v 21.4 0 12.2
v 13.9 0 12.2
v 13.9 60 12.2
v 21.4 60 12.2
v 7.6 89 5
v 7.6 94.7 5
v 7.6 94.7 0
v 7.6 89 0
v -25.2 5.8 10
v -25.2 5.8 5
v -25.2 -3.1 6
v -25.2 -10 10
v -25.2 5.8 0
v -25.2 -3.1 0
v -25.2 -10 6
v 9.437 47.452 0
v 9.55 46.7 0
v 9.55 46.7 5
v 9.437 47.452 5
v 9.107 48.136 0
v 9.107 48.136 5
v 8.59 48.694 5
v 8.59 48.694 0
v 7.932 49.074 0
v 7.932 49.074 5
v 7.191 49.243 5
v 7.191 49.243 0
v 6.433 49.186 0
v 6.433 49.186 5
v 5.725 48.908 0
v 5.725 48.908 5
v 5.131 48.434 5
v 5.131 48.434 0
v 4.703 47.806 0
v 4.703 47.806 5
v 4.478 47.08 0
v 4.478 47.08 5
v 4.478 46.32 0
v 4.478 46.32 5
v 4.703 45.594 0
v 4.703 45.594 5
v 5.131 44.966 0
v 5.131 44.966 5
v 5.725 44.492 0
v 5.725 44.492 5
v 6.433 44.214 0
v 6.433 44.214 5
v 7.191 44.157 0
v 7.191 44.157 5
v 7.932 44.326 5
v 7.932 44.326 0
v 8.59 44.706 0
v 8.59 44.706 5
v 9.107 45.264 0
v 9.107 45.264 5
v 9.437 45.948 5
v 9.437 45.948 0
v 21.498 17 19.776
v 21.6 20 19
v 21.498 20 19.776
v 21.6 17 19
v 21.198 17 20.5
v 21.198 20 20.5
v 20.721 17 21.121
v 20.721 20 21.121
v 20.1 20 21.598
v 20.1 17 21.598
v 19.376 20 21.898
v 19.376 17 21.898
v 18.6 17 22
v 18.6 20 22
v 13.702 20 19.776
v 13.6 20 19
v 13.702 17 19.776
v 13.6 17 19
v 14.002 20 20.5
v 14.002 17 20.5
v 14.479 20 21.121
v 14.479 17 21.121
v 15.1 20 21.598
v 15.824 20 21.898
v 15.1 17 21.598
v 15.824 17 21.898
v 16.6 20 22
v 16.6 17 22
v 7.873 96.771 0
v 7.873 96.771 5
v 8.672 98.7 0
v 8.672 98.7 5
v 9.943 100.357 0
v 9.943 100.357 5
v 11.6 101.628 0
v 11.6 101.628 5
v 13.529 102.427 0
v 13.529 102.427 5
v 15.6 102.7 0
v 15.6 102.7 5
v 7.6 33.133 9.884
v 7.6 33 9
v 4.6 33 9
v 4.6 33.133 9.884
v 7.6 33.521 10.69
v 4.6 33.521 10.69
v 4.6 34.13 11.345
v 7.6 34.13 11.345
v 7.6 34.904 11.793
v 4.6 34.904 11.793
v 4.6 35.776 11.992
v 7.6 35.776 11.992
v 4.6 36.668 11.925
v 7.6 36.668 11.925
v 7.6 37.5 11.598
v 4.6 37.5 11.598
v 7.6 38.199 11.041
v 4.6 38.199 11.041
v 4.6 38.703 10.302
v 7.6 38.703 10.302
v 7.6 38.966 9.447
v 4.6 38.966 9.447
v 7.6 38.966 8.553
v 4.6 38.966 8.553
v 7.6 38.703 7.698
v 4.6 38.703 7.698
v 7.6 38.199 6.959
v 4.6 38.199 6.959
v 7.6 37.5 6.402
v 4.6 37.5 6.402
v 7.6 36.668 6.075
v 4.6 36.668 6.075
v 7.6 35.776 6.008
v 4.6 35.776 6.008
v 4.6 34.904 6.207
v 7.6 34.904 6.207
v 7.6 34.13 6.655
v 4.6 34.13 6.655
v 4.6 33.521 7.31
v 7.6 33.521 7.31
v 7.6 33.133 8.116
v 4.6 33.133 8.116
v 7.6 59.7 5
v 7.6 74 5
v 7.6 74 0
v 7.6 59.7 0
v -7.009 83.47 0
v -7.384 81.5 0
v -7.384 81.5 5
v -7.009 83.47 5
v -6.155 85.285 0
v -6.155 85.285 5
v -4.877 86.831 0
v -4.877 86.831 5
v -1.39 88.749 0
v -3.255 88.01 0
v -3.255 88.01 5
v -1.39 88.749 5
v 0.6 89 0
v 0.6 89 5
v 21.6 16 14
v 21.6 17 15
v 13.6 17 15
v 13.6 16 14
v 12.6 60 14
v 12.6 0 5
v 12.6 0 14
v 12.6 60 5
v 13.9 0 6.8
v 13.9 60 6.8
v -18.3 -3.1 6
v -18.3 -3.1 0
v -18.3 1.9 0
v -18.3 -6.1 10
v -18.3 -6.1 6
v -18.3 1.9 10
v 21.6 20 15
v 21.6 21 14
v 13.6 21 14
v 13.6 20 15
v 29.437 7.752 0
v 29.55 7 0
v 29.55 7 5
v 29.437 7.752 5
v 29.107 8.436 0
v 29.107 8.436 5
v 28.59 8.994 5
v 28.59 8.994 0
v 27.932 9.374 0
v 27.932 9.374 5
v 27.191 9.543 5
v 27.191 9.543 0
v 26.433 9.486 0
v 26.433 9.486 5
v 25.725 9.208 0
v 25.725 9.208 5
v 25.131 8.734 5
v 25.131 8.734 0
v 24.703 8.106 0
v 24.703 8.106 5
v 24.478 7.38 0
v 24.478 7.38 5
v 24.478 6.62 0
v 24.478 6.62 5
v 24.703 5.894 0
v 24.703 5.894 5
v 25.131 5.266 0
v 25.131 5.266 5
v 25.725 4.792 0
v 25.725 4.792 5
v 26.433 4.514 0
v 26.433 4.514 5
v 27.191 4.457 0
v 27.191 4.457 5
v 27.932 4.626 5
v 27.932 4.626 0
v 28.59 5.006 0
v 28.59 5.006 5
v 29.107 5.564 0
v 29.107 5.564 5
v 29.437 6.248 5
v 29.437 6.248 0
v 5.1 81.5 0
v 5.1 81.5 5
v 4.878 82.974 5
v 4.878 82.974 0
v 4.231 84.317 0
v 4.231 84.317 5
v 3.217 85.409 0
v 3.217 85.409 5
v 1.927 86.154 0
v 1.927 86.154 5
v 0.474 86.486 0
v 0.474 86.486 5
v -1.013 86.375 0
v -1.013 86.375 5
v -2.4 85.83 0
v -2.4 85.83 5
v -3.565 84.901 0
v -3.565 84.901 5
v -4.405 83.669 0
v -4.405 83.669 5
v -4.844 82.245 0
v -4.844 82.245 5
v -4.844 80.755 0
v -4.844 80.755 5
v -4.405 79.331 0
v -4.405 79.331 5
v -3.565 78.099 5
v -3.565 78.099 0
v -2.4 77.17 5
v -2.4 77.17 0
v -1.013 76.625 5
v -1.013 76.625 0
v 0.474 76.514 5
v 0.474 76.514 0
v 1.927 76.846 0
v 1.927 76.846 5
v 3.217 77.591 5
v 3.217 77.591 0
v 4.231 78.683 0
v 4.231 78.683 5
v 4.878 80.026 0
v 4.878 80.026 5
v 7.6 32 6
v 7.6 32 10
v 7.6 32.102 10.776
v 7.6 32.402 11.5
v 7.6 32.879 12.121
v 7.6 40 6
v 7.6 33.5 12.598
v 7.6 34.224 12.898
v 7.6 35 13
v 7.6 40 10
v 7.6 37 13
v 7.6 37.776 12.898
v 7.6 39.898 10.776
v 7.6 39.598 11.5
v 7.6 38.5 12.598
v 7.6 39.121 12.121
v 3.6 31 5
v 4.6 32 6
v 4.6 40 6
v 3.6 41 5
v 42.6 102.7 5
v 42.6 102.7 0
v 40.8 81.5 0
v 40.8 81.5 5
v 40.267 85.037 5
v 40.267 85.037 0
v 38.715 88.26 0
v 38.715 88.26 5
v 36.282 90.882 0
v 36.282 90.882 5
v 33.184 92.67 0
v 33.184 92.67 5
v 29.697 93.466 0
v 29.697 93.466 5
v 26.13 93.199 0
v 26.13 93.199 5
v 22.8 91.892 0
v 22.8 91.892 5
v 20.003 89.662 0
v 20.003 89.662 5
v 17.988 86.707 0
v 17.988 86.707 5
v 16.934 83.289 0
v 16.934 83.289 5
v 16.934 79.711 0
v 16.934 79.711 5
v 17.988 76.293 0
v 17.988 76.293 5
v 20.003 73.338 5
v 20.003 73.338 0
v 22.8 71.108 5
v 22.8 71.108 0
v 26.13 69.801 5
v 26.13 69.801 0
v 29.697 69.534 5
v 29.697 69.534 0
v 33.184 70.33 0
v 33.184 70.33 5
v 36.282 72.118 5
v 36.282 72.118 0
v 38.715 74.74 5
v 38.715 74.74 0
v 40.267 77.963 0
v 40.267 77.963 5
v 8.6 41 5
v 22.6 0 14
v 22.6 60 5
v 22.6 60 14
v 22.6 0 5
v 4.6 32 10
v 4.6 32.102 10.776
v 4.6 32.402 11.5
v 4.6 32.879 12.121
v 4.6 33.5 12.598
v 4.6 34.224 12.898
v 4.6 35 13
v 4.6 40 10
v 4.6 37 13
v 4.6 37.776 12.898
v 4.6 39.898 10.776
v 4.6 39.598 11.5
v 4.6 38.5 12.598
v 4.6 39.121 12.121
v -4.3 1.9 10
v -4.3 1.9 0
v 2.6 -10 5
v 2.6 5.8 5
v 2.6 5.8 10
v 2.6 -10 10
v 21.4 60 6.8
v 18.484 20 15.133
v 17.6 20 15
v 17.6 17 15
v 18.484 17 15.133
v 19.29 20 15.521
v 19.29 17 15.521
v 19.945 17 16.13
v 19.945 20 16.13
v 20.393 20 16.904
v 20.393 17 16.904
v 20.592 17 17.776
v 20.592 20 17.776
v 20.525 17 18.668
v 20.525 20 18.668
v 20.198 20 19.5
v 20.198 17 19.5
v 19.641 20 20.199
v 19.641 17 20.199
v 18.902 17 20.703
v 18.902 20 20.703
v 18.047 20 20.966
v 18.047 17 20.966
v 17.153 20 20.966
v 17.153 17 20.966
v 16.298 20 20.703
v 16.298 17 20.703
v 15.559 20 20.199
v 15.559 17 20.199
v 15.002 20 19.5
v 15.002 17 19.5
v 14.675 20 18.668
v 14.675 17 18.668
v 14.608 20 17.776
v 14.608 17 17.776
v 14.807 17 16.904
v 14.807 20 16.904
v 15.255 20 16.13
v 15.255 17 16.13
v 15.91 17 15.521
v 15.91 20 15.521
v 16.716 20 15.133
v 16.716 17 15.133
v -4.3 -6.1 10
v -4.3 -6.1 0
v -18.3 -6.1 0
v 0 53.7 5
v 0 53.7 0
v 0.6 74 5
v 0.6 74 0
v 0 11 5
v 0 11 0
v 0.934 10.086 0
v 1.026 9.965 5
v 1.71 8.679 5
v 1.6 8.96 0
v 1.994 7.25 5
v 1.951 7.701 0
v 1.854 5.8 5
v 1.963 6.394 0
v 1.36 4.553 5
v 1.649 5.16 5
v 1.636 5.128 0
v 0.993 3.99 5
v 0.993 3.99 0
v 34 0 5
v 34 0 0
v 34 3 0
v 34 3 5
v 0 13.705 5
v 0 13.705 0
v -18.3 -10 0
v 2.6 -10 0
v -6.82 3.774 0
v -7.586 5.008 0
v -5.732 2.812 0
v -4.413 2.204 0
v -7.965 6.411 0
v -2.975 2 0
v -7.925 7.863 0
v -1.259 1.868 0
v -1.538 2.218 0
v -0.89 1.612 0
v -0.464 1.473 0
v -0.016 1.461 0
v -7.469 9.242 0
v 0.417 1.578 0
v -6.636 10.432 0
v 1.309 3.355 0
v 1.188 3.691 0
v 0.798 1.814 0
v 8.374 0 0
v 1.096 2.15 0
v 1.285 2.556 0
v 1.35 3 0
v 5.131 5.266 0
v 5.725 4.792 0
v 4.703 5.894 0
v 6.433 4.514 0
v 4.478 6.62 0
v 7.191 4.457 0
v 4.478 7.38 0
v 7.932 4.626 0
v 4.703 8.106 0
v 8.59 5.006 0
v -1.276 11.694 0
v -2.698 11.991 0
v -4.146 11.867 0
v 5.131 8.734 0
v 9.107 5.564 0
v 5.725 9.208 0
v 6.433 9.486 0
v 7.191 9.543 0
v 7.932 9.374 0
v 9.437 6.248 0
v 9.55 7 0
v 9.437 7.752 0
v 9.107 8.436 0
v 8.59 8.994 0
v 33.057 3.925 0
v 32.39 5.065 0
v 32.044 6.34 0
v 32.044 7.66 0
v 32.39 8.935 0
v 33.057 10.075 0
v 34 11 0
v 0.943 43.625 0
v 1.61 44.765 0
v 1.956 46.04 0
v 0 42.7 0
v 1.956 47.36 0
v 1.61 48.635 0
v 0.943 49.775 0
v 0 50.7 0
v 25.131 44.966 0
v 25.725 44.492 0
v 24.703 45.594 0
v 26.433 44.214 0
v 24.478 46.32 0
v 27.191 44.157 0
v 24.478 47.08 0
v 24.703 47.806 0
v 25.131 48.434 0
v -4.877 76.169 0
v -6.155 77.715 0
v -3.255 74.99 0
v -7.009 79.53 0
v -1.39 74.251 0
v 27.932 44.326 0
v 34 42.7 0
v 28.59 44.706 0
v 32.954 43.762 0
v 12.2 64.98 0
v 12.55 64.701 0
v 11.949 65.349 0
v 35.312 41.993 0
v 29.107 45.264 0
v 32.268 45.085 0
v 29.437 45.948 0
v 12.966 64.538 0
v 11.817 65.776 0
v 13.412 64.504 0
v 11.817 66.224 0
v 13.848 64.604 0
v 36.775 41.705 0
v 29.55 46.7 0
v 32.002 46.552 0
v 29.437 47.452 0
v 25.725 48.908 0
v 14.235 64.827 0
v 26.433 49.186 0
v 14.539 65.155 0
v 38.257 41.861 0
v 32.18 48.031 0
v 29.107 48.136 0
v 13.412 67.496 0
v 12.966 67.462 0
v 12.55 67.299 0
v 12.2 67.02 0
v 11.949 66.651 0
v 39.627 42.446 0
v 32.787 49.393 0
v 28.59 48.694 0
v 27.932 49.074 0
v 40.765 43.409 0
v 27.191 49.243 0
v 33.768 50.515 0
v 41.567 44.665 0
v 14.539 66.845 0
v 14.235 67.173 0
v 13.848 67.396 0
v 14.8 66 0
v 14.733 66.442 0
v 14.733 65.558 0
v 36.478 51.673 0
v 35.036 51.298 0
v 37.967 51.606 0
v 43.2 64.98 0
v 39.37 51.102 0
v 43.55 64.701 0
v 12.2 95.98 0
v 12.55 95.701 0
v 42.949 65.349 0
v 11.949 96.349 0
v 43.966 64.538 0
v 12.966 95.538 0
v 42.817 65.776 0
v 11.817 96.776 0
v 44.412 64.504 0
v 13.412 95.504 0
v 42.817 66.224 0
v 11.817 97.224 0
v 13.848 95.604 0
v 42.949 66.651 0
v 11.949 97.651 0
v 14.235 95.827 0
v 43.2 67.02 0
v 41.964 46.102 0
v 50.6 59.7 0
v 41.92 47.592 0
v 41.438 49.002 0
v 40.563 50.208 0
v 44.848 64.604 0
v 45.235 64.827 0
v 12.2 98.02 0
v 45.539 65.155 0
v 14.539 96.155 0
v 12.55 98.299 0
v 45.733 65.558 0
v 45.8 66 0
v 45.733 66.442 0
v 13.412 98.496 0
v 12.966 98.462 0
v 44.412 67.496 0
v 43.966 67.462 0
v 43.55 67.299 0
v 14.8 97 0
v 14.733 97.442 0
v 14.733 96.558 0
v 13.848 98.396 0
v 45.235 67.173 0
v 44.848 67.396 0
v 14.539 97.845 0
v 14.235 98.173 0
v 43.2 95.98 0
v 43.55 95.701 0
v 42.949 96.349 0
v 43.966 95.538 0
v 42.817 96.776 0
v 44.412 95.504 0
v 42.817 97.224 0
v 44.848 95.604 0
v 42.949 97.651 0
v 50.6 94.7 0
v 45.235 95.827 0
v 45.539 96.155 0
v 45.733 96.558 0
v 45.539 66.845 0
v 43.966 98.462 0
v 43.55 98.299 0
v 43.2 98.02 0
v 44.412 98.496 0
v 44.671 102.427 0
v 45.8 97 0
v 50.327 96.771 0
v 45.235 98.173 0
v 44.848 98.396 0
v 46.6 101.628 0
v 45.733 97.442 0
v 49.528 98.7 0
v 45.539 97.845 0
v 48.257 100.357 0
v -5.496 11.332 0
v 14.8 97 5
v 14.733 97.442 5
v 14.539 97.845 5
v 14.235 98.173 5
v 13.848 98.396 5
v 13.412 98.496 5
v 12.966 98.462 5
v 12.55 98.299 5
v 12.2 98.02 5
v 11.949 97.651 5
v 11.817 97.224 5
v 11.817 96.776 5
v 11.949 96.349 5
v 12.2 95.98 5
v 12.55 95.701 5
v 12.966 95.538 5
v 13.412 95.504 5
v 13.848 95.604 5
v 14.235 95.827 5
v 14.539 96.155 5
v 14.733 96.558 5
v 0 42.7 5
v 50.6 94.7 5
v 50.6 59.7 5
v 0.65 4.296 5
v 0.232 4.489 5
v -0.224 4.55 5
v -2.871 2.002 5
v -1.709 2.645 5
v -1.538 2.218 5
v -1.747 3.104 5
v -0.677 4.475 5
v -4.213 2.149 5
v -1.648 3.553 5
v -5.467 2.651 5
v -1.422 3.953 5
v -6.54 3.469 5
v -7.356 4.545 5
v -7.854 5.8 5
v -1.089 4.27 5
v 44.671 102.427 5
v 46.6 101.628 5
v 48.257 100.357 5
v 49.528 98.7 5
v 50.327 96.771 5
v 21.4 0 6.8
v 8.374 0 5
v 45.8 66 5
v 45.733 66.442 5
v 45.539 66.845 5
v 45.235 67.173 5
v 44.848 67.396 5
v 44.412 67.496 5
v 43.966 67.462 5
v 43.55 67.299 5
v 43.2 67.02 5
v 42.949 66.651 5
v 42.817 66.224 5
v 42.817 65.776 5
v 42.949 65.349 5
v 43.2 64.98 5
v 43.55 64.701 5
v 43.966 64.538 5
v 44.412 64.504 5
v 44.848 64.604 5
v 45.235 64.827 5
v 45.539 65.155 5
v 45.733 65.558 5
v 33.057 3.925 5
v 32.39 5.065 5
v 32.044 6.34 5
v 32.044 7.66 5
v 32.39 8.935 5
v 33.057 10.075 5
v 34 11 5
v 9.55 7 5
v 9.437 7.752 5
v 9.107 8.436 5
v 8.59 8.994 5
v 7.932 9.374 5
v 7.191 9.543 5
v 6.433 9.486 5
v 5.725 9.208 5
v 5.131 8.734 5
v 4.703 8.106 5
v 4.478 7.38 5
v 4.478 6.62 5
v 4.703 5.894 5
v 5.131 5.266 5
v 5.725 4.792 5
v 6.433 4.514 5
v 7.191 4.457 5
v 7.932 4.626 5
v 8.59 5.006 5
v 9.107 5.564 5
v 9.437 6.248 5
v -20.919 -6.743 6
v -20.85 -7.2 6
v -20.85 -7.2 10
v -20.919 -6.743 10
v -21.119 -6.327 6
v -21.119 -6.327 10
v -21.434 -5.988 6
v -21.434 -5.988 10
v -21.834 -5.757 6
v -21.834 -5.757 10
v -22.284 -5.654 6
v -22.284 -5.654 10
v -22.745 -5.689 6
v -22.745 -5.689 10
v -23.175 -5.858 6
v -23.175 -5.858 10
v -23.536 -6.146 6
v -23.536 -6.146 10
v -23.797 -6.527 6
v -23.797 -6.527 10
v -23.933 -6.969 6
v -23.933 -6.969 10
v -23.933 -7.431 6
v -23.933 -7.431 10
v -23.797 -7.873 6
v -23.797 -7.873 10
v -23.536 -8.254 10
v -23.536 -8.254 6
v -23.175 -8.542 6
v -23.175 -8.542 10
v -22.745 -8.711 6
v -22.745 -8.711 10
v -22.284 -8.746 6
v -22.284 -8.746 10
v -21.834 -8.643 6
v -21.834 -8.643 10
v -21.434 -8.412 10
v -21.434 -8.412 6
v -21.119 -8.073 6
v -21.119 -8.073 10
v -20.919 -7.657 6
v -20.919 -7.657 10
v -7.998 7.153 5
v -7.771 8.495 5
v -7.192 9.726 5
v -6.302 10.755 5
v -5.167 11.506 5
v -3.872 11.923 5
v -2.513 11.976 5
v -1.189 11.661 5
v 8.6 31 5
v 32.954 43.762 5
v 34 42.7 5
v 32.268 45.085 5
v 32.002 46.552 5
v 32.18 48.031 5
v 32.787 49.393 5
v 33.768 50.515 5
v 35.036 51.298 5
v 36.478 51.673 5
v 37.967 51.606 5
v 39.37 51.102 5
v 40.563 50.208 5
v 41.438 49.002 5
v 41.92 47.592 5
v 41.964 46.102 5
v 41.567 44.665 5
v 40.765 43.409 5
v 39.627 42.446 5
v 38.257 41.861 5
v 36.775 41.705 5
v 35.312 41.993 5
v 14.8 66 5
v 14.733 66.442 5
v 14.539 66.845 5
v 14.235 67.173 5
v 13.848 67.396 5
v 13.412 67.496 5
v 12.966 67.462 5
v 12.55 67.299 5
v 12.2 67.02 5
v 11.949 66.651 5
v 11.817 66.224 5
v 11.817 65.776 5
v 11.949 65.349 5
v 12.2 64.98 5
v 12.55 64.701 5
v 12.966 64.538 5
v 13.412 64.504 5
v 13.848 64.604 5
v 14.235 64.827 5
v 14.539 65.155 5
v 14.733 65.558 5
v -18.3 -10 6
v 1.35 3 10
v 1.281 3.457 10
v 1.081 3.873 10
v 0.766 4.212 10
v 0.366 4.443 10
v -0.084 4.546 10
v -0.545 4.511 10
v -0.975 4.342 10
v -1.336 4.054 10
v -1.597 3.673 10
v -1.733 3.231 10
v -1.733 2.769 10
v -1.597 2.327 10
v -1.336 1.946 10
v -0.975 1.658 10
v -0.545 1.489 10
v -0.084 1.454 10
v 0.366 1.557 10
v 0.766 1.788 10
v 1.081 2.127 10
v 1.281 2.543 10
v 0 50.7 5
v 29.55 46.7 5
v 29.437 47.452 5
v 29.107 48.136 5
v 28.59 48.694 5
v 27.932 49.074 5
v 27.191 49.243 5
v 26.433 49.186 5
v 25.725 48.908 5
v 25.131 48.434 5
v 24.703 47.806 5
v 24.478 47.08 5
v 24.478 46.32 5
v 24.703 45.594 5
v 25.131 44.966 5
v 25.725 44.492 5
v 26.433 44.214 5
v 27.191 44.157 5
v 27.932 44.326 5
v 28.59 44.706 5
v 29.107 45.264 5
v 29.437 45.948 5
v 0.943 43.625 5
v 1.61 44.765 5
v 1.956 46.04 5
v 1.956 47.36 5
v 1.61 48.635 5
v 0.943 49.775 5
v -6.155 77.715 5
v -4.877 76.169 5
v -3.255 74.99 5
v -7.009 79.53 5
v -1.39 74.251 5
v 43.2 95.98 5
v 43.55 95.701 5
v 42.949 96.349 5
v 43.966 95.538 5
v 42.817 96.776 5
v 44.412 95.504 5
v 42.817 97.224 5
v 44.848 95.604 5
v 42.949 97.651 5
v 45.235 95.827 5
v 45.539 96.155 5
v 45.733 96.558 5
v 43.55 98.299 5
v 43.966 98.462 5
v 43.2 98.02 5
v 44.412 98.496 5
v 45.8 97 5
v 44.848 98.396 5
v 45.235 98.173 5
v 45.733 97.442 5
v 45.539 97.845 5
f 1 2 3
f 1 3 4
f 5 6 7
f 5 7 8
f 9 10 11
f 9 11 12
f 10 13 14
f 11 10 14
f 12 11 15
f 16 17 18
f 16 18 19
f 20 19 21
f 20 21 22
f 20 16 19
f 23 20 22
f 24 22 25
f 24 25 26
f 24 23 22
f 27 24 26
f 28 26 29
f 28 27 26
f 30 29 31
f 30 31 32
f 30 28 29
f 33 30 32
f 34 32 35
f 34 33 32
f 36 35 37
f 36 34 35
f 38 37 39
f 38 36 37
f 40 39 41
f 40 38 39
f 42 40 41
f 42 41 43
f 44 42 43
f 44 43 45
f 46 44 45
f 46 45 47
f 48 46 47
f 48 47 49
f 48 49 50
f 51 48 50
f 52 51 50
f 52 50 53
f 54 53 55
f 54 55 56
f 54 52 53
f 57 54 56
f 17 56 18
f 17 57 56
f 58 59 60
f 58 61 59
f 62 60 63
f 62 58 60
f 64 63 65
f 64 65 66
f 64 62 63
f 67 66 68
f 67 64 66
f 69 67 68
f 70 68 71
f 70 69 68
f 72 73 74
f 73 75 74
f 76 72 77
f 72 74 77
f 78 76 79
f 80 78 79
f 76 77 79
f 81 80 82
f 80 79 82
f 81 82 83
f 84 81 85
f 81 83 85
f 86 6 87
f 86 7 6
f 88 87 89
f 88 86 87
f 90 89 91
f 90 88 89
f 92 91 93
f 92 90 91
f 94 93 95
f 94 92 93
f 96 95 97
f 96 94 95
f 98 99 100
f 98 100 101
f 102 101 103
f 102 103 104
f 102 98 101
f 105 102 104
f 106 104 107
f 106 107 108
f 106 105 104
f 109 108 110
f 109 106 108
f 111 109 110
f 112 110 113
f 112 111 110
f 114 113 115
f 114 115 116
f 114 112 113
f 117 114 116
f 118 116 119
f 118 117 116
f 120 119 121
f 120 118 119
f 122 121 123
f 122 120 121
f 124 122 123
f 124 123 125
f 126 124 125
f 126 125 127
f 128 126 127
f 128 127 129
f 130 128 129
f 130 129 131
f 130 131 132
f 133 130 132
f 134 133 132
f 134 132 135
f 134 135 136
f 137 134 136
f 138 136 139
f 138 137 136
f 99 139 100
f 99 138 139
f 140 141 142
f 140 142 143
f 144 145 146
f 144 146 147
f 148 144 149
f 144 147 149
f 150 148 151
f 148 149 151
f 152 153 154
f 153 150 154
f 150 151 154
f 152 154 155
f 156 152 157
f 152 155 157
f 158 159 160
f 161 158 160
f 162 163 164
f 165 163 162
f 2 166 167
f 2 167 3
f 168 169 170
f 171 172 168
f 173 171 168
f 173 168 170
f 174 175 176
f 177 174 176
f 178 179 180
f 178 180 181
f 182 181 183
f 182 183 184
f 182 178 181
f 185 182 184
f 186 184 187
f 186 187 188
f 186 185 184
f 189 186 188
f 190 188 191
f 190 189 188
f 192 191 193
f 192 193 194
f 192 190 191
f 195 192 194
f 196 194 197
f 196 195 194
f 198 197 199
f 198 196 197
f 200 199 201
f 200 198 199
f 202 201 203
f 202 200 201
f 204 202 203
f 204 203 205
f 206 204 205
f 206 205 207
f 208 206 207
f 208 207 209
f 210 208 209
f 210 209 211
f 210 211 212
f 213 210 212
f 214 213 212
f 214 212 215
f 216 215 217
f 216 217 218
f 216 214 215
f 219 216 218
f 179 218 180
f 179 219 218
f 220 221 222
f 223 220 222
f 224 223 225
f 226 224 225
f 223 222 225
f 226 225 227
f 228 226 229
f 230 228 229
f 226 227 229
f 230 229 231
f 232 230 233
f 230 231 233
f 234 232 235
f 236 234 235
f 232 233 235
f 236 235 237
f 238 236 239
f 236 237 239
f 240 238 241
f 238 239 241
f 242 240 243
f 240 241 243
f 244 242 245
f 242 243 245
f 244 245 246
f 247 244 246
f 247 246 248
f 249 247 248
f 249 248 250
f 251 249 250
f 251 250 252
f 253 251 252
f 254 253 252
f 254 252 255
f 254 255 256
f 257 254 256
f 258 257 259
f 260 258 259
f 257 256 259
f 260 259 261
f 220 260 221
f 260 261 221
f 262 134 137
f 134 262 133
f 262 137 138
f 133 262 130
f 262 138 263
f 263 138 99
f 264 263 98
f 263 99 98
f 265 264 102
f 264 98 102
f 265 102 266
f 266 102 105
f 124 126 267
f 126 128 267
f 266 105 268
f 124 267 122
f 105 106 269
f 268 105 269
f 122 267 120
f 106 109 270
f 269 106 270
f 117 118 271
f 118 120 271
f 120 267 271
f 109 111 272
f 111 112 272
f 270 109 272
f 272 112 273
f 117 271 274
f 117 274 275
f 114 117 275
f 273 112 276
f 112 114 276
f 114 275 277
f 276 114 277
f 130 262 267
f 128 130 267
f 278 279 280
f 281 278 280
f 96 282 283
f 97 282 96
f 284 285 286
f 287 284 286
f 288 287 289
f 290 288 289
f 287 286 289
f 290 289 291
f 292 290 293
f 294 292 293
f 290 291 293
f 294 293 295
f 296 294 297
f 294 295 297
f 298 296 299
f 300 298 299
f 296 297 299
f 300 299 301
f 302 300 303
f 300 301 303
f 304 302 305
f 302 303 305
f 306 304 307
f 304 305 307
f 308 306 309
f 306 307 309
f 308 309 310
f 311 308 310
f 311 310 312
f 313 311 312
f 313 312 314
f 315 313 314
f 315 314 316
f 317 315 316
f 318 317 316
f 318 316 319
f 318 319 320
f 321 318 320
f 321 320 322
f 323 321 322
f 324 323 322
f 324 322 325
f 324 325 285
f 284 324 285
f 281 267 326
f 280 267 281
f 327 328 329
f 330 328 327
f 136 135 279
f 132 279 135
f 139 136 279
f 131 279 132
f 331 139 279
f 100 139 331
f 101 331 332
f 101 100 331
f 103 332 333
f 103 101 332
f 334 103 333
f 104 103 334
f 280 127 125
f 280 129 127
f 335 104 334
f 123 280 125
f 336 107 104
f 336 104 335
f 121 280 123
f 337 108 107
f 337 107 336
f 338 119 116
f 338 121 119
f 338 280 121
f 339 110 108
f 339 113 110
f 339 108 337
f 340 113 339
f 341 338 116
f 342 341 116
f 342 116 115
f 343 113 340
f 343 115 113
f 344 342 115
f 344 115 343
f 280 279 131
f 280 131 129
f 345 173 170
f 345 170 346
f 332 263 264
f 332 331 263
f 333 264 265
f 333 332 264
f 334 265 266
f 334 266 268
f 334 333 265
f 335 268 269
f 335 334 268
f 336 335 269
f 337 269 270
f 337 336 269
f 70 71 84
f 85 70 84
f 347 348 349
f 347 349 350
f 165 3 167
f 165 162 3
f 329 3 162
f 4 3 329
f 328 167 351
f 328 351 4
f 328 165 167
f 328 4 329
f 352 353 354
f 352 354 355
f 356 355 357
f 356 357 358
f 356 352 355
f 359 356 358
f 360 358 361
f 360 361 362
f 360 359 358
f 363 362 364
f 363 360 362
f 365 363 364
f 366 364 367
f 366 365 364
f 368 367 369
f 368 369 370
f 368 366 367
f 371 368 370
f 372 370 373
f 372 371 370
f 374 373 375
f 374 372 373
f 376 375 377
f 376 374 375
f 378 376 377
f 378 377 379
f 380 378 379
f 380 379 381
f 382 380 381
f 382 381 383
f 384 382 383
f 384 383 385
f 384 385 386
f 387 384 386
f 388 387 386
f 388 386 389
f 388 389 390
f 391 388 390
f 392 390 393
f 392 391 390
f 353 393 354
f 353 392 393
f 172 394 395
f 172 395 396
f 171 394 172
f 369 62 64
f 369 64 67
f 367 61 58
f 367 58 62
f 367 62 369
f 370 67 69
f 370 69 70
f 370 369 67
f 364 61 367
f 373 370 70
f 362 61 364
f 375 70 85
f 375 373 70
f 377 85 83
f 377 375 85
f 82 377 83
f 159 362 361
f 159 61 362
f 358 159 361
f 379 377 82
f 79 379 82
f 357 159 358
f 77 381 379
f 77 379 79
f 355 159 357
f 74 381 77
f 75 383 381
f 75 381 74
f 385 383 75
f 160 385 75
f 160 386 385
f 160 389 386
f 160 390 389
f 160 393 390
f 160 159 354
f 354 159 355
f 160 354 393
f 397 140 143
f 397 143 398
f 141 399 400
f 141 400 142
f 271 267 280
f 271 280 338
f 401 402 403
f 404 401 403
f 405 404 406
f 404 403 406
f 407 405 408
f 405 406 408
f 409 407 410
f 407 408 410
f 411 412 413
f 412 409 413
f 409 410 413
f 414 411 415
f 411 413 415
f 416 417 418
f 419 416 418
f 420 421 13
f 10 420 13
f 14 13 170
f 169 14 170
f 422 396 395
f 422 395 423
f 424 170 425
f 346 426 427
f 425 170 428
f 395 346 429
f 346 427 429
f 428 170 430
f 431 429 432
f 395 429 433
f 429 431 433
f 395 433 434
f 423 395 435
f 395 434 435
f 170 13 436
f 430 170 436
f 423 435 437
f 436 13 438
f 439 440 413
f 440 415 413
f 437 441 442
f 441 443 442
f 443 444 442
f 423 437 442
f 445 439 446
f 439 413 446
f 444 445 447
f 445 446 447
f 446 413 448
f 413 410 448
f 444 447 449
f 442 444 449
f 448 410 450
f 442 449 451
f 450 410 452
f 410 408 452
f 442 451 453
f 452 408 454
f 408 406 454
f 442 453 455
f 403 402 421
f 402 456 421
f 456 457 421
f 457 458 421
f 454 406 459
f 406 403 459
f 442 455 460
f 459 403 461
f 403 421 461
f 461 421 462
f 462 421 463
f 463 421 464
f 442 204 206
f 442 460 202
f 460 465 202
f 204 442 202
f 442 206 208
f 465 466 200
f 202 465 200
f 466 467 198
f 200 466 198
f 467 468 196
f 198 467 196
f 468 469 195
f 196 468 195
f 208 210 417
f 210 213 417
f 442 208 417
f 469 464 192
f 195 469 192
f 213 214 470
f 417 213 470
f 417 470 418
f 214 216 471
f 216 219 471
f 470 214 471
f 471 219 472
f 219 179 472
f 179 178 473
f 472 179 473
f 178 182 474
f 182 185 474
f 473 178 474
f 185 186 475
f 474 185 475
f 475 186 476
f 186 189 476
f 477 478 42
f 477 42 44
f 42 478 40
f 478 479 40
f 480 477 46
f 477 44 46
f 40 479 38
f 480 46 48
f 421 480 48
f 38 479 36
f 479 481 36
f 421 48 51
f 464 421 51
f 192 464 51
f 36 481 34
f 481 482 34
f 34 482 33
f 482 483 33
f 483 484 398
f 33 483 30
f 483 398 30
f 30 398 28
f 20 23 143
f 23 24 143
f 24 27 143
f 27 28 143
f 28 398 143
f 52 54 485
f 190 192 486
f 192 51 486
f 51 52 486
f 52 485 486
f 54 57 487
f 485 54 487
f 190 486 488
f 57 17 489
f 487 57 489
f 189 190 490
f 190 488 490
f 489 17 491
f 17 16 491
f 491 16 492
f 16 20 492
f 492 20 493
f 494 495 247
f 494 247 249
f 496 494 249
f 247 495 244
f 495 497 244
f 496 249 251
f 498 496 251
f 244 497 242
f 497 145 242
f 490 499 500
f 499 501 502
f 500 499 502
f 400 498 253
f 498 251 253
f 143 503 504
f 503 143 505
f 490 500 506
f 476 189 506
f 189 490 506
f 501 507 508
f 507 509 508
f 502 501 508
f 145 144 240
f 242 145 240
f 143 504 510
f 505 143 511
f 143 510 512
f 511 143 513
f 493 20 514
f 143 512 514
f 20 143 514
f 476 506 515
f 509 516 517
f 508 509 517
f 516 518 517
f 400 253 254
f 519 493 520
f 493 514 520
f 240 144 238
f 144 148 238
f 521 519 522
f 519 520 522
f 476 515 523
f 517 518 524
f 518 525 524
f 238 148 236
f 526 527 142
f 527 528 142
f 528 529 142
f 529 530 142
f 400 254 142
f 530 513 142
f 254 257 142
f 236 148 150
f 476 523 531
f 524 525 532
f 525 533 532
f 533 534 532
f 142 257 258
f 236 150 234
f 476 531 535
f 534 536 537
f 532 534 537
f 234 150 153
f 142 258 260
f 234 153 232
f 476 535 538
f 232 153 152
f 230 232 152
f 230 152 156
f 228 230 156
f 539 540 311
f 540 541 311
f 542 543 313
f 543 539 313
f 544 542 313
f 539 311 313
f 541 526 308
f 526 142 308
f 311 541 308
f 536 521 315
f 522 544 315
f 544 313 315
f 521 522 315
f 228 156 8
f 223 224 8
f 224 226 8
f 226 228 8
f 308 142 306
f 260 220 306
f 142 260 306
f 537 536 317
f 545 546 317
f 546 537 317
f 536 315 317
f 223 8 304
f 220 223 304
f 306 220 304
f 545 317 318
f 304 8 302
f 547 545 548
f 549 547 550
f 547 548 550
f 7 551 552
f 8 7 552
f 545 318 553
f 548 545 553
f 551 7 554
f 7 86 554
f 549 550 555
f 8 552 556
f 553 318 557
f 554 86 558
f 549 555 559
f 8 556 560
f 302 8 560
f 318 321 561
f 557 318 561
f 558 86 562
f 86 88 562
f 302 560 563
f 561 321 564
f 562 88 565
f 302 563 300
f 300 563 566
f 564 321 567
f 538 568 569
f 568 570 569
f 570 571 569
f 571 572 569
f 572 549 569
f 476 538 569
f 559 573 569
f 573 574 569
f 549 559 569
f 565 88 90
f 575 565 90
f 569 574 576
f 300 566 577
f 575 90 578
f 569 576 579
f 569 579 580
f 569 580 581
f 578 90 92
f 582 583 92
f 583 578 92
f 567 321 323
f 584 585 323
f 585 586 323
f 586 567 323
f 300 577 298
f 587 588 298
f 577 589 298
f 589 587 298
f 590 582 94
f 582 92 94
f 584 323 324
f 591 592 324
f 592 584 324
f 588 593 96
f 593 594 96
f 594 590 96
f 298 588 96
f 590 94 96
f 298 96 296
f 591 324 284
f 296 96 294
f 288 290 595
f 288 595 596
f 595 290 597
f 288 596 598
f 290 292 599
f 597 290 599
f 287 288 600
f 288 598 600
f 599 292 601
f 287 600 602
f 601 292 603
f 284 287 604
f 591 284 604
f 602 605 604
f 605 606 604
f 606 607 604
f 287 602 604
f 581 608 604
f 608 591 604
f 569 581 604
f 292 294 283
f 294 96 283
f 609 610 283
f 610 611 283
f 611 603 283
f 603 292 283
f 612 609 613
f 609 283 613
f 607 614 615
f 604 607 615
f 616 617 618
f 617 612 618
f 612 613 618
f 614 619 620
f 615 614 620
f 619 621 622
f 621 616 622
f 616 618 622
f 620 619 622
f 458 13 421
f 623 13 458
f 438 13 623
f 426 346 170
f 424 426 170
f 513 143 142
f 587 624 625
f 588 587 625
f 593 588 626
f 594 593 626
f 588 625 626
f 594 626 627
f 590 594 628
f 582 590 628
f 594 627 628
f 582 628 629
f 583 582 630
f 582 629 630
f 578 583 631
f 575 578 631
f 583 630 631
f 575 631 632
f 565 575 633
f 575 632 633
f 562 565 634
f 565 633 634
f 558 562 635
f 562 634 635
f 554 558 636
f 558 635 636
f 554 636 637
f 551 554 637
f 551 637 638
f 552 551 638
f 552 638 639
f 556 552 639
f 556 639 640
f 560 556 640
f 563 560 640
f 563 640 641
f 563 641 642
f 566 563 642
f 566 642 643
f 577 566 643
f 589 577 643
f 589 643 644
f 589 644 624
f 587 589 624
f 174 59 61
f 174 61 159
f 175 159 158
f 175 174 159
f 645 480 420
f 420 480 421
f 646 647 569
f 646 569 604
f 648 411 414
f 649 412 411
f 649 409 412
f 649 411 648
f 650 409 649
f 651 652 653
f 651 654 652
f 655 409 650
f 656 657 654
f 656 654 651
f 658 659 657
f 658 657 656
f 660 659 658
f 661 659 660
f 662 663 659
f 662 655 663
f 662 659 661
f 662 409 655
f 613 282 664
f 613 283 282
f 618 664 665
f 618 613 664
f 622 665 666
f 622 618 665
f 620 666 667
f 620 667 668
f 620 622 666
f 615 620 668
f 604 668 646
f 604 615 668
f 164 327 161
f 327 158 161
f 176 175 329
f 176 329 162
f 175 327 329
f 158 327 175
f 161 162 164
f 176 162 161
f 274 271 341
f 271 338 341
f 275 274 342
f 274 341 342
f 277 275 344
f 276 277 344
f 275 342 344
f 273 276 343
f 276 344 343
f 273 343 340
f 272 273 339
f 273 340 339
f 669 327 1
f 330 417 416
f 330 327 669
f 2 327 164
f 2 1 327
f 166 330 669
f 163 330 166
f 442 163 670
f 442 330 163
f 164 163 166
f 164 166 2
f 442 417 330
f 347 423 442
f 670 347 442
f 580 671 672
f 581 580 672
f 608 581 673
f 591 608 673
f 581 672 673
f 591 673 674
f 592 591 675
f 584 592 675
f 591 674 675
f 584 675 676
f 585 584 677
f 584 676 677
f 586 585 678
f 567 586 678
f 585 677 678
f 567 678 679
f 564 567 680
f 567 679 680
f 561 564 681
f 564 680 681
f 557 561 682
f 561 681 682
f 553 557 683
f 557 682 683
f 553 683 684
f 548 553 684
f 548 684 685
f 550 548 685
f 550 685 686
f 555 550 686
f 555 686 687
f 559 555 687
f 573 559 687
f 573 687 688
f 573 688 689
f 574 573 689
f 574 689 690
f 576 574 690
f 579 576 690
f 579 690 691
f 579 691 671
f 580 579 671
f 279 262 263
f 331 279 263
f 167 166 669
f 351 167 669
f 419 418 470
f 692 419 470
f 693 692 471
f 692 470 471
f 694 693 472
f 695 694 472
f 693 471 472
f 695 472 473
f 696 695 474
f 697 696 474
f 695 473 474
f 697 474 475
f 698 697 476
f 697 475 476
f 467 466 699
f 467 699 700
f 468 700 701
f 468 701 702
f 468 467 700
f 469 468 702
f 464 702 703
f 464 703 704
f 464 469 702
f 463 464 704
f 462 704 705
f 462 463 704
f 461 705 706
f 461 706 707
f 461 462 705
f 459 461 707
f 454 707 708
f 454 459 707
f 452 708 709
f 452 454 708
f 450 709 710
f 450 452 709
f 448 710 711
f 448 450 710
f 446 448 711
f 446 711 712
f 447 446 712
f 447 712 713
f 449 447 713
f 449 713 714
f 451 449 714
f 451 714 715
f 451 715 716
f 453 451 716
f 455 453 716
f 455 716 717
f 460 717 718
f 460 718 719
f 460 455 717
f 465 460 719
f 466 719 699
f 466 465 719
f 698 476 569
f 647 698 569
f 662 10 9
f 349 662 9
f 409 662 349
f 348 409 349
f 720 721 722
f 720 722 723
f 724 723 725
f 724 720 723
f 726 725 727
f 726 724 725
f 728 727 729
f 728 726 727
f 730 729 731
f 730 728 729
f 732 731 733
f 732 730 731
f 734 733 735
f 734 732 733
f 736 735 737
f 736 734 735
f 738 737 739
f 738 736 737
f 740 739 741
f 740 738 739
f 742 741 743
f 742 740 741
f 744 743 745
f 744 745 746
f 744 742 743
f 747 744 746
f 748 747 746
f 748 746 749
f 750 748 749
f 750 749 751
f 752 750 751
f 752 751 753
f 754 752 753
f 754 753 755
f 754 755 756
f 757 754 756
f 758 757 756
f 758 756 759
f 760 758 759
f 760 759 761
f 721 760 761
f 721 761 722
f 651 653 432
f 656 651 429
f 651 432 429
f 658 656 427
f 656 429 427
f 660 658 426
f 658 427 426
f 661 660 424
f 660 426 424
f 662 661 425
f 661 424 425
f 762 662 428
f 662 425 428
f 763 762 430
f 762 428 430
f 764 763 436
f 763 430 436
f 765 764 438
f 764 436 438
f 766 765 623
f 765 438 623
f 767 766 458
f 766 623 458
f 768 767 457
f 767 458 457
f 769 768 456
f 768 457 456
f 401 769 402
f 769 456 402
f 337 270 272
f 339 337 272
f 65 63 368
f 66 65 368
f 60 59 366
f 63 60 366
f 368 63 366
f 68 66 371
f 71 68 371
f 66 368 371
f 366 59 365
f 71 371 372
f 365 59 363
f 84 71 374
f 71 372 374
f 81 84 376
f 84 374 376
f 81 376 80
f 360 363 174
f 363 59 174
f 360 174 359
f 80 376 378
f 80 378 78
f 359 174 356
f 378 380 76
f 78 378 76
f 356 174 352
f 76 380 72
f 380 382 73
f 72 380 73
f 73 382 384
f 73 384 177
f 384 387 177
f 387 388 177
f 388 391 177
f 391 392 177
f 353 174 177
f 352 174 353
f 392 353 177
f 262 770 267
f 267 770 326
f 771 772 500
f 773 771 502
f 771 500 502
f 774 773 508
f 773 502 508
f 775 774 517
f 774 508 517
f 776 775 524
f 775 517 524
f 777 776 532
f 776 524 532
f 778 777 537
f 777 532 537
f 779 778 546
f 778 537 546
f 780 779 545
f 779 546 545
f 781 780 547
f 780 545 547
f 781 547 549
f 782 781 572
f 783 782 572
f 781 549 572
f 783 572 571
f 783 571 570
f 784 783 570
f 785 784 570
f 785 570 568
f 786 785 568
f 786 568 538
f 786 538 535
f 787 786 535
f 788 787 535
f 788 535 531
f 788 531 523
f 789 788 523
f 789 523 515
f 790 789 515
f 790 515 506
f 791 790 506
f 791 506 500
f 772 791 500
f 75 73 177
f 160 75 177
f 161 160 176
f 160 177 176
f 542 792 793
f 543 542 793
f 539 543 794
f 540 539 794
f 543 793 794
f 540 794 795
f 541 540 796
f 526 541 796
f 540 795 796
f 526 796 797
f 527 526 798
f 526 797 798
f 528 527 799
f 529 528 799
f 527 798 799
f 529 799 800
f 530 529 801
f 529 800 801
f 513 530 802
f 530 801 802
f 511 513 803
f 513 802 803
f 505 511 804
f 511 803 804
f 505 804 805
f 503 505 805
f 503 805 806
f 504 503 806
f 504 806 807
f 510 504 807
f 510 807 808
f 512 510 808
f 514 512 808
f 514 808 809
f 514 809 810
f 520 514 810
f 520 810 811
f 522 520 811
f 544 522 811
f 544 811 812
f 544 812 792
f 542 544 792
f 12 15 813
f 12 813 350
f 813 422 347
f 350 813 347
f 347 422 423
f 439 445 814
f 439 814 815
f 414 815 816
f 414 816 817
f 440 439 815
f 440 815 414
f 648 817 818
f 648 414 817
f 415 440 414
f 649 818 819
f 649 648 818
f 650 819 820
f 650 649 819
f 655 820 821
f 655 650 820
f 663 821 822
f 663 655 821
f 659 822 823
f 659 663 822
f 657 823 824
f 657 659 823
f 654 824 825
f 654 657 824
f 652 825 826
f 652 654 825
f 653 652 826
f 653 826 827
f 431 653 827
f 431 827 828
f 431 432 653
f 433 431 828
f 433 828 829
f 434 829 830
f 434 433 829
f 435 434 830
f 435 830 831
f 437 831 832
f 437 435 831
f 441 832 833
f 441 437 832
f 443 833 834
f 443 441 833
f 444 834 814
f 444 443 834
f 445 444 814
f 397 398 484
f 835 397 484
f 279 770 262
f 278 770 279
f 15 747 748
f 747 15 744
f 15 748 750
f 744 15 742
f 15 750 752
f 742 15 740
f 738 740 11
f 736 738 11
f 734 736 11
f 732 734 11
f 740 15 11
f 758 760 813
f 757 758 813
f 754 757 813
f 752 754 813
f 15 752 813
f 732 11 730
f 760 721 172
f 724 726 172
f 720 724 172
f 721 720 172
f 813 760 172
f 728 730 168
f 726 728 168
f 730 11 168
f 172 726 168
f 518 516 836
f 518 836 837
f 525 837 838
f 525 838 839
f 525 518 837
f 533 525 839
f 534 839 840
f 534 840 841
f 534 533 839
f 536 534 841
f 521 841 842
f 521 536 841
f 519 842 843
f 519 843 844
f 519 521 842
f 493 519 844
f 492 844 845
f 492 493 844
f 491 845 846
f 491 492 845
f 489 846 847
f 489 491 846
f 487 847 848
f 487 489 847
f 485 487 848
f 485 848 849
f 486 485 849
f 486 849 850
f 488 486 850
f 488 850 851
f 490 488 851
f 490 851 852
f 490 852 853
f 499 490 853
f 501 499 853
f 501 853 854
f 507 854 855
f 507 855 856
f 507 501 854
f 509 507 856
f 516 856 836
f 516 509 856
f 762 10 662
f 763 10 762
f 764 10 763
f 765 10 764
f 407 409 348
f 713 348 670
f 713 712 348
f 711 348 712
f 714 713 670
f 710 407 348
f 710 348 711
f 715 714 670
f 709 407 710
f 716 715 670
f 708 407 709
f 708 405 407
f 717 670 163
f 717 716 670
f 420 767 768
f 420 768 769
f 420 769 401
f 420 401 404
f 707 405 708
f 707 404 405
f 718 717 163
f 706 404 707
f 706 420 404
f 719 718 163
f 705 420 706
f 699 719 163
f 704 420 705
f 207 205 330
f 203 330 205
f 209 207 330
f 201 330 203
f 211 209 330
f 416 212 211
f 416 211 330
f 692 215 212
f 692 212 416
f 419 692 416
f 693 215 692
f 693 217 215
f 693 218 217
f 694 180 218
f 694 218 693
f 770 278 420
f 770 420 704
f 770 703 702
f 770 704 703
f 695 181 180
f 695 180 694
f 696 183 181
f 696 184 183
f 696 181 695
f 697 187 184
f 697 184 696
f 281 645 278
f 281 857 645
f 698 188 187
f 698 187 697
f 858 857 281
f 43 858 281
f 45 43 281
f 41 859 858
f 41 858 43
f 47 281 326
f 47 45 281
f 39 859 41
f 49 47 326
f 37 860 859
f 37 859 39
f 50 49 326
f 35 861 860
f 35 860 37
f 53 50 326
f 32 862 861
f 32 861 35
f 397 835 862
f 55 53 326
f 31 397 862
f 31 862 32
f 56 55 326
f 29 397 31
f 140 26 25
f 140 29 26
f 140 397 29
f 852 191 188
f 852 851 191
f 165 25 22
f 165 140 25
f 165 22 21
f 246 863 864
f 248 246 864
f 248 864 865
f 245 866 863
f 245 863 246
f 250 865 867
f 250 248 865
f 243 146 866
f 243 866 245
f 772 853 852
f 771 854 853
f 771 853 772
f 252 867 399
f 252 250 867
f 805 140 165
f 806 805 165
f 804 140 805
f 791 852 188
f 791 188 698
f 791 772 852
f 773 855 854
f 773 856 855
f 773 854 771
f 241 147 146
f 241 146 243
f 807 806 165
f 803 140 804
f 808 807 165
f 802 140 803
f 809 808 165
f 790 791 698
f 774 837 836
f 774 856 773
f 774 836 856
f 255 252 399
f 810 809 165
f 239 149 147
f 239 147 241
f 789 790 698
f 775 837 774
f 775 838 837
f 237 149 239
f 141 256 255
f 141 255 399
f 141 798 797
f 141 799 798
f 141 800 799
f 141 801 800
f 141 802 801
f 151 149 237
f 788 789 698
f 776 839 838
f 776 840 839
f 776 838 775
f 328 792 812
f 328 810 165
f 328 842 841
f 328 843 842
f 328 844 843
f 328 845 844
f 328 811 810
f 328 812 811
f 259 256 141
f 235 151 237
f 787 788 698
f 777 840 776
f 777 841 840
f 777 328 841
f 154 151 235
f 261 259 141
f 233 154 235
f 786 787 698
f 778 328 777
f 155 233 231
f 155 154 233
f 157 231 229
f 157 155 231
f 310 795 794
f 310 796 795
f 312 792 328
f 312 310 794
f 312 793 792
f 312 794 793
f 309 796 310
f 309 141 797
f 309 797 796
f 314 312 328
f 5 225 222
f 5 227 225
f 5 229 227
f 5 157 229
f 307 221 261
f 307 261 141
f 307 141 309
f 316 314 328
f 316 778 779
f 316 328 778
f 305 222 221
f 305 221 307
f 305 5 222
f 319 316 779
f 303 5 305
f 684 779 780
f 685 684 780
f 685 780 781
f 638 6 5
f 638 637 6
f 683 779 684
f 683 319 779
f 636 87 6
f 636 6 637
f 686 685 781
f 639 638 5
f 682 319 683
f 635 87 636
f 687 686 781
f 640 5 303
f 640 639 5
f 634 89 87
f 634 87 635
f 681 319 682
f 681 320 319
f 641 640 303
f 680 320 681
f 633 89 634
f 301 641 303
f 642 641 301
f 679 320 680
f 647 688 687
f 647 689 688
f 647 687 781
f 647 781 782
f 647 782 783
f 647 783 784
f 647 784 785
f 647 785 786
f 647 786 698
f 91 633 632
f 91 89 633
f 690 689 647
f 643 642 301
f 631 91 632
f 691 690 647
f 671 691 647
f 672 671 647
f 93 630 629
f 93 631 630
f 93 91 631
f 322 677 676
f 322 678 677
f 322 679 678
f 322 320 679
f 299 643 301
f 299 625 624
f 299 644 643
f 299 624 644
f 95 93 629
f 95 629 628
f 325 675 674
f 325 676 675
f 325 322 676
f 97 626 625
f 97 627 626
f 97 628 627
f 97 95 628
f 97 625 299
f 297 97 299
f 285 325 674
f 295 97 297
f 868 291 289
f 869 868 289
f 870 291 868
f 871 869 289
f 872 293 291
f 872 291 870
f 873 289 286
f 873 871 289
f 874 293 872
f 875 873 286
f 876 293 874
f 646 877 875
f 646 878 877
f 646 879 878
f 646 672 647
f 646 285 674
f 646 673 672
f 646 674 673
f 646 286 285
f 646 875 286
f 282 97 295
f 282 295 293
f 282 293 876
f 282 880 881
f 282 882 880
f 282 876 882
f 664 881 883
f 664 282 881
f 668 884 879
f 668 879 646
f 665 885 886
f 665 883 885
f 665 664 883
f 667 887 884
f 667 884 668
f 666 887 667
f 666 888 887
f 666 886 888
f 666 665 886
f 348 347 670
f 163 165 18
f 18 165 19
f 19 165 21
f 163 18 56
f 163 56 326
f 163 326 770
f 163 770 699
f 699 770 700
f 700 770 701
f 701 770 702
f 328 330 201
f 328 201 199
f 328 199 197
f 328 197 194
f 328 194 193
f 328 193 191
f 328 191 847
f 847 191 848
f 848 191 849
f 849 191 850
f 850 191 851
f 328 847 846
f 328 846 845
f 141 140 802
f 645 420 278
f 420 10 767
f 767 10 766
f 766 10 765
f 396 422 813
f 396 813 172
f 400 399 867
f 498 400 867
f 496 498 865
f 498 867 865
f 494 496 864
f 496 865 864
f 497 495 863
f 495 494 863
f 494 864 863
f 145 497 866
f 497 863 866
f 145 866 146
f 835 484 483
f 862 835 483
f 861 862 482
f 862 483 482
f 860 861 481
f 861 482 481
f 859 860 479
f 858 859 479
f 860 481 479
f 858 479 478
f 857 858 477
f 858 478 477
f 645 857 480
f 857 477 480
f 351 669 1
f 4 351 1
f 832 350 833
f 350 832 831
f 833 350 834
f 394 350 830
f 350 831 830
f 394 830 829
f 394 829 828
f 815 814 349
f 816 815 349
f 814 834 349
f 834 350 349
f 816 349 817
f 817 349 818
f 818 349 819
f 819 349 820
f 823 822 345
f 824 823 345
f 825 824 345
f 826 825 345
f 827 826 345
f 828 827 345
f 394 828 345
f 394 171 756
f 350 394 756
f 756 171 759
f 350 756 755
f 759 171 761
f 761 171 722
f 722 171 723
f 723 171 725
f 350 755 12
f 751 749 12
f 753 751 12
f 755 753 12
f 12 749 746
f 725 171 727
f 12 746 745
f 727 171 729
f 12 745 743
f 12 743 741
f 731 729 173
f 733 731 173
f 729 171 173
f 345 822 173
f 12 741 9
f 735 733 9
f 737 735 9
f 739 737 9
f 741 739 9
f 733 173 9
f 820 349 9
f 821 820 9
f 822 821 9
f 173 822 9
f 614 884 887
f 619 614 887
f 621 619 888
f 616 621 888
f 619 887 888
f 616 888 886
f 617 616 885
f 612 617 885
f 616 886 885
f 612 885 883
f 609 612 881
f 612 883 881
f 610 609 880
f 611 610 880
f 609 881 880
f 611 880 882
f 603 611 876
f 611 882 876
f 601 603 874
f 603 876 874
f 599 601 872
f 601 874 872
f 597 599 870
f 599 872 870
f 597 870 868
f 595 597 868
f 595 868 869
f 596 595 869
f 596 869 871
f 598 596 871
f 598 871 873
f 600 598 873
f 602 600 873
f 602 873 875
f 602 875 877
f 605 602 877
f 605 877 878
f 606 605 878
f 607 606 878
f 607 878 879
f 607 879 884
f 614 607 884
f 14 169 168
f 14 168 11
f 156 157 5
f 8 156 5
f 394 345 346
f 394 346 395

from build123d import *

# Parameters (mm, degrees)
SKETCH1_R            = 2.550000000000004
SKETCH1_R_2          = 2.5499999999999914
SKETCH1_R_3          = 2.5500000000000007
SKETCH1_R_4          = 2.550000000000003
BOSS_EXTRUDE1_DEPTH  = 5
BOSS_EXTRUDE2_DEPTH  = 9
BOSS_EXTRUDE3_DEPTH  = 5
BOSS_EXTRUDE4_DEPTH  = 5
SKETCH8_R            = 1.5000000000000009
SKETCH8_R_2          = 1.5000000000000042
SKETCH8_R_3          = 12.000000000000002
CUT_EXTRUDE3_DEPTH   = 115.84184777336179
BOSS_EXTRUDE5_START  = -5
BOSS_EXTRUDE5_DEPTH  = 5
FILLET1_R            = 8
BOSS_EXTRUDE7_START  = 5
BOSS_EXTRUDE7_DEPTH  = 5
CUT_EXTRUDE4_START   = -10
SKETCH12_R           = 1.5500000000000012
SKETCH12_R_2         = 1.5500000000000003
CUT_EXTRUDE4_DEPTH   = 10
SKETCH13_W           = 14.999999999999995
SKETCH13_H           = 15.000000000000043
SKETCH13_R           = 5.0000000000000036
BOSS_EXTRUDE8_DEPTH  = 5
FILLET2_R            = 8
CUT_EXTRUDE5_DEPTH   = 115.92454046025158
SKETCH15_W           = 7.5
SKETCH15_H           = 5.399999999999997
CUT_EXTRUDE6_DEPTH   = 60
SKETCH17_W           = 8
SKETCH17_H           = 7.999999999999998
SKETCH17_R           = 2.999999999999999
BOSS_EXTRUDE10_DEPTH = 3
FILLET4_R            = 3
CHAMFER1_SIZE        = 1
SKETCH18_W           = 8
SKETCH18_H           = 7.999999999999993
SKETCH18_R           = 3
BOSS_EXTRUDE11_DEPTH = 3
FILLET5_R            = 3
CHAMFER2_SIZE        = 1
CUT_EXTRUDE7_DEPTH   = 6


# Some blends are built 0.0001 mm under size
with BuildPart() as part:
    # Sketch1 → Boss-Extrude1 (new body)
    with BuildSketch(Plane.XY):
        with BuildLine():
            Line((0, 0), (33.99999999999999, 0))
            Line((33.99999999999999, 0), (33.99999999999999, 3.0000000000000107))
            ThreePointArc((33.99999999999999, 3.0000000000000107), (32.00000000000001, 7), (33.99999999999999, 10.99999999999999))
            Line((33.99999999999999, 10.99999999999999), (34, 42.7))
            ThreePointArc((34, 42.7), (32, 46.699999999999996), (34, 50.699999999999996))
            Line((34, 50.699999999999996), (34, 53.7))
            Line((34, 53.7), (0, 53.7))
            Line((0, 53.7), (-8.7e-16, 50.7))
            ThreePointArc((-8.7e-16, 50.7), (1.9999999999999938, 46.7), (-8.7e-16, 42.70000000000001))
            Line((-8.7e-16, 42.70000000000001), (-8.7e-16, 10.999999999999995))
            ThreePointArc((-8.7e-16, 10.999999999999995), (1.9999999999999973, 6.9999999999999964), (-8.7e-16, 2.9999999999999982))
            Line((-8.7e-16, 2.9999999999999982), (0, 0))
        make_face()
        with Locations((6.999999999999999, 46.7)):
            Circle(SKETCH1_R, mode=Mode.SUBTRACT)
        with Locations((27, 46.70000000000002)):
            Circle(SKETCH1_R_2, mode=Mode.SUBTRACT)
        with Locations((6.999999999999999, 6.999999999999997)):
            Circle(SKETCH1_R_3, mode=Mode.SUBTRACT)
        with Locations((27.000000000000004, 6.999999999999999)):
            Circle(SKETCH1_R_4, mode=Mode.SUBTRACT)
    extrude(amount=BOSS_EXTRUDE1_DEPTH)

    # Sketch2 → Boss-Extrude2 (add)
    with BuildSketch(Plane.XY.offset(5)):
        Polygon((22.599999999999994, 60), (22.6, 0), (12.600000000000001, 0), (12.599999999999998, 60), align=None)
    extrude(amount=BOSS_EXTRUDE2_DEPTH)

    # Sketch3 → Boss-Extrude3 (add)
    with BuildSketch(Plane.XY.offset(5)):
        Polygon((2.5999999999999983, 5.799999999999998), (2.5999999999999983, -10), (-25.200000000000003, -10.000000000000004), (-25.200000000000006, 5.799999999999998), align=None)
    extrude(amount=BOSS_EXTRUDE3_DEPTH)

    # Sketch6 → Boss-Extrude4 (add, through all)
    with BuildSketch(Plane.XY.offset(5)):
        Polygon((50.6, 102.70000000000002), (7.6, 102.70000000000002), (7.600000000000005, 59.70000000000002), (50.60000000000001, 59.70000000000002), align=None)
        Polygon((50.60000000000001, 59.70000000000002), (7.600000000000005, 59.70000000000002), (0, 53.7), (34, 53.7), align=None)
    extrude(amount=-BOSS_EXTRUDE4_DEPTH)

    # Sketch8 → Cut-Extrude3 (cut, through all)
    with BuildSketch(Plane.XY.offset(5)):
        with Locations((13.299999999999999, 97.00000000000001)):
            Circle(SKETCH8_R)
        with Locations((44.3, 97.00000000000001)):
            Circle(SKETCH8_R_2)
        with Locations((13.300000000000002, 66.00000000000001)):
            Circle(SKETCH8_R)
        with Locations((44.3, 66.00000000000001)):
            Circle(SKETCH8_R_2)
        with Locations((28.8, 81.50000000000001)):
            Circle(SKETCH8_R_3)
    extrude(amount=-CUT_EXTRUDE3_DEPTH, mode=Mode.SUBTRACT)

    # Sketch9 → Boss-Extrude5 (add)
    with BuildSketch(Plane.XY.offset(5).offset(BOSS_EXTRUDE5_START)):
        with BuildLine():
            Line((33.99999999999999, 10.999999999999986), (50.6, 59.70000000000002))
            Line((50.6, 59.70000000000002), (34, 53.7))
            Line((34, 53.7), (34, 50.699999999999996))
            ThreePointArc((34, 50.699999999999996), (39.236067977499786, 51.172135954999575), (42, 46.699999999999996))
            ThreePointArc((42, 46.699999999999996), (39.236067977499786, 42.227864045000416), (34, 42.7))
            Line((34, 42.7), (33.99999999999999, 10.99999999999999))
        make_face()
    extrude(amount=BOSS_EXTRUDE5_DEPTH)

    # Fillet1
    fillet1_edges = [part.edges().sort_by_distance(p)[0] for p in [
        (50.6, 102.70000000000002, 2.5),
        (7.6, 102.70000000000002, 2.5),
    ]]
    fillet(fillet1_edges, radius=FILLET1_R)

    # Sketch11 → Boss-Extrude7 (add)
    with BuildSketch(Plane(origin=(0, 0, 5), x_dir=(-1, 0, 0), z_dir=(0, 0, -1)).offset(BOSS_EXTRUDE7_START)):
        with BuildLine():
            Line((-2.5999999999999983, -10), (-8.37350269189618, 0))
            Line((-8.37350269189618, 0), (0, 0))
            Line((0, 0), (3.47e-15, 2.9999999999999982))
            ThreePointArc((3.47e-15, 2.9999999999999982), (7.999999999999998, 6.9999999999999964), (8.7e-16, 10.999999999999995))
            Line((8.7e-16, 10.999999999999995), (3.52e-15, 13.705401938363094))
            Line((3.52e-15, 13.705401938363094), (25.200000000000006, 5.799999999999998))
            Line((25.200000000000006, 5.799999999999998), (25.200000000000003, -10.000000000000004))
            Line((25.200000000000003, -10.000000000000004), (-2.5999999999999983, -10))
        make_face()
    extrude(amount=-BOSS_EXTRUDE7_DEPTH)

    # Sketch12 → Cut-Extrude4 (cut)
    with BuildSketch(Plane.XY.offset(10).offset(CUT_EXTRUDE4_START)):
        with Locations((-22.400000000000006, -7.2)):
            Circle(SKETCH12_R)
        with Locations((-0.20000000000000182, 2.999999999999998)):
            Circle(SKETCH12_R_2)
    extrude(amount=CUT_EXTRUDE4_DEPTH, mode=Mode.SUBTRACT)

    # Sketch13 → Boss-Extrude8 (add)
    with BuildSketch(Plane.XY.offset(5)):
        with Locations((0.09999999999999964, 81.50000000000003)):
            Rectangle(SKETCH13_W, SKETCH13_H)
        with Locations((0.09999999999999969, 81.50000000000001)):
            Circle(SKETCH13_R, mode=Mode.SUBTRACT)
    extrude(amount=-BOSS_EXTRUDE8_DEPTH)

    # Fillet2
    # the kernel refuses this fillet: 8 mm, written as the material it takes off along each edge
    with BuildSketch(Plane(origin=(-7.399999999999999, 74, 25), x_dir=(1, 0, 0), z_dir=(0, 0, -1))) as fillet2_piece_1:
        with BuildLine():
            CenterArc((FILLET2_R, -FILLET2_R), FILLET2_R, 90, 90)
            Line((-8.9e-16, -FILLET2_R), (0, 0))
            Line((0, 0), (FILLET2_R, 0))
        make_face()
    extrude(amount=45, mode=Mode.SUBTRACT)
    with BuildSketch(Plane(origin=(-7.399999999999999, 89.00000000000004, 25), x_dir=(1, 0, 0), z_dir=(0, 0, -1))) as fillet2_piece_2:
        with BuildLine():
            CenterArc((FILLET2_R, FILLET2_R), FILLET2_R, 180, 90)
            Line((-8.9e-16, FILLET2_R), (0, 0))
            Line((0, 0), (FILLET2_R, 0))
        make_face()
    extrude(amount=45, mode=Mode.SUBTRACT)

    # Sketch14 → Cut-Extrude5 (cut, through all)
    with BuildSketch(Plane.XY.offset(10)):
        Polygon((-18.300000000000004, 1.8999999999999955), (-4.300000000000003, 1.8999999999999972), (-4.300000000000003, -6.1), (-18.300000000000004, -6.100000000000001), align=None)
    extrude(amount=-CUT_EXTRUDE5_DEPTH, mode=Mode.SUBTRACT)

    # Sketch15 → Cut-Extrude6 (cut)
    with BuildSketch(Plane.XZ):
        with Locations((17.65, 9.5)):
            Rectangle(SKETCH15_W, SKETCH15_H)
    extrude(amount=-CUT_EXTRUDE6_DEPTH, mode=Mode.SUBTRACT)

    # Sketch17 → Boss-Extrude10 (add)
    with BuildSketch(Plane(origin=(0, 20, 0), x_dir=(-1, 0, 0), z_dir=(0, -1, 0))):
        with Locations((-17.6, -18)):
            Rectangle(SKETCH17_W, SKETCH17_H)
        with Locations(Location((-17.6, -18, 0), (0, 0, 90))):
            Circle(SKETCH17_R, mode=Mode.SUBTRACT)
    extrude(amount=BOSS_EXTRUDE10_DEPTH)

    # Fillet4
    fillet4_edges = [part.edges().sort_by_distance(p)[0] for p in [
        (21.6, 18.5, 22),
        (13.600000000000001, 18.5, 22),
    ]]
    fillet(fillet4_edges, radius=FILLET4_R)

    # Chamfer1
    chamfer1_edges = [part.edges().sort_by_distance(p)[0] for p in [
        (17.6, 17, 14.000000000000002),
        (17.6, 20, 14.000000000000002),
    ]]
    chamfer(chamfer1_edges, length=CHAMFER1_SIZE - 0.0001)  # a hair under: the kernel refuses the full size

    # Sketch18 → Boss-Extrude11 (add)
    with BuildSketch(Plane.ZY.offset(-7.600000000000001)):
        with Locations((9.000000000000002, 35.999999999999986)):
            Rectangle(SKETCH18_W, SKETCH18_H)
        with Locations(Location((9.000000000000002, 35.99999999999999, 0), (0, 0, 270))):
            Circle(SKETCH18_R, mode=Mode.SUBTRACT)
    extrude(amount=BOSS_EXTRUDE11_DEPTH)

    # Fillet5
    fillet5_edges = [part.edges().sort_by_distance(p)[0] for p in [
        (6.1, 31.999999999999993, 13.000000000000002),
        (6.099999999999999, 39.999999999999986, 13.000000000000002),
    ]]
    fillet(fillet5_edges, radius=FILLET5_R)

    # Chamfer2
    chamfer2_edges = [part.edges().sort_by_distance(p)[0] for p in [
        (4.6, 35.999999999999986, 5.000000000000001),
        (7.6, 35.999999999999986, 5.000000000000001),
        (6.099999999999999, 39.999999999999986, 5.000000000000001),
        (6.1, 31.999999999999993, 5.000000000000001),
    ]]
    chamfer(chamfer2_edges, length=CHAMFER2_SIZE)

    # Sketch19 → Cut-Extrude7 (cut)
    with BuildSketch(Plane(origin=(0, 0, 0), x_dir=(-1, 0, 0), z_dir=(0, 0, -1))):
        Polygon((25.200000000000003, -10.000000000000004), (18.300000000000004, -10.000000000000004), (18.300000000000008, -3.1000000000000036), (25.200000000000006, -3.1000000000000028), align=None)
    extrude(amount=-CUT_EXTRUDE7_DEPTH, mode=Mode.SUBTRACT)


solid = part.part
